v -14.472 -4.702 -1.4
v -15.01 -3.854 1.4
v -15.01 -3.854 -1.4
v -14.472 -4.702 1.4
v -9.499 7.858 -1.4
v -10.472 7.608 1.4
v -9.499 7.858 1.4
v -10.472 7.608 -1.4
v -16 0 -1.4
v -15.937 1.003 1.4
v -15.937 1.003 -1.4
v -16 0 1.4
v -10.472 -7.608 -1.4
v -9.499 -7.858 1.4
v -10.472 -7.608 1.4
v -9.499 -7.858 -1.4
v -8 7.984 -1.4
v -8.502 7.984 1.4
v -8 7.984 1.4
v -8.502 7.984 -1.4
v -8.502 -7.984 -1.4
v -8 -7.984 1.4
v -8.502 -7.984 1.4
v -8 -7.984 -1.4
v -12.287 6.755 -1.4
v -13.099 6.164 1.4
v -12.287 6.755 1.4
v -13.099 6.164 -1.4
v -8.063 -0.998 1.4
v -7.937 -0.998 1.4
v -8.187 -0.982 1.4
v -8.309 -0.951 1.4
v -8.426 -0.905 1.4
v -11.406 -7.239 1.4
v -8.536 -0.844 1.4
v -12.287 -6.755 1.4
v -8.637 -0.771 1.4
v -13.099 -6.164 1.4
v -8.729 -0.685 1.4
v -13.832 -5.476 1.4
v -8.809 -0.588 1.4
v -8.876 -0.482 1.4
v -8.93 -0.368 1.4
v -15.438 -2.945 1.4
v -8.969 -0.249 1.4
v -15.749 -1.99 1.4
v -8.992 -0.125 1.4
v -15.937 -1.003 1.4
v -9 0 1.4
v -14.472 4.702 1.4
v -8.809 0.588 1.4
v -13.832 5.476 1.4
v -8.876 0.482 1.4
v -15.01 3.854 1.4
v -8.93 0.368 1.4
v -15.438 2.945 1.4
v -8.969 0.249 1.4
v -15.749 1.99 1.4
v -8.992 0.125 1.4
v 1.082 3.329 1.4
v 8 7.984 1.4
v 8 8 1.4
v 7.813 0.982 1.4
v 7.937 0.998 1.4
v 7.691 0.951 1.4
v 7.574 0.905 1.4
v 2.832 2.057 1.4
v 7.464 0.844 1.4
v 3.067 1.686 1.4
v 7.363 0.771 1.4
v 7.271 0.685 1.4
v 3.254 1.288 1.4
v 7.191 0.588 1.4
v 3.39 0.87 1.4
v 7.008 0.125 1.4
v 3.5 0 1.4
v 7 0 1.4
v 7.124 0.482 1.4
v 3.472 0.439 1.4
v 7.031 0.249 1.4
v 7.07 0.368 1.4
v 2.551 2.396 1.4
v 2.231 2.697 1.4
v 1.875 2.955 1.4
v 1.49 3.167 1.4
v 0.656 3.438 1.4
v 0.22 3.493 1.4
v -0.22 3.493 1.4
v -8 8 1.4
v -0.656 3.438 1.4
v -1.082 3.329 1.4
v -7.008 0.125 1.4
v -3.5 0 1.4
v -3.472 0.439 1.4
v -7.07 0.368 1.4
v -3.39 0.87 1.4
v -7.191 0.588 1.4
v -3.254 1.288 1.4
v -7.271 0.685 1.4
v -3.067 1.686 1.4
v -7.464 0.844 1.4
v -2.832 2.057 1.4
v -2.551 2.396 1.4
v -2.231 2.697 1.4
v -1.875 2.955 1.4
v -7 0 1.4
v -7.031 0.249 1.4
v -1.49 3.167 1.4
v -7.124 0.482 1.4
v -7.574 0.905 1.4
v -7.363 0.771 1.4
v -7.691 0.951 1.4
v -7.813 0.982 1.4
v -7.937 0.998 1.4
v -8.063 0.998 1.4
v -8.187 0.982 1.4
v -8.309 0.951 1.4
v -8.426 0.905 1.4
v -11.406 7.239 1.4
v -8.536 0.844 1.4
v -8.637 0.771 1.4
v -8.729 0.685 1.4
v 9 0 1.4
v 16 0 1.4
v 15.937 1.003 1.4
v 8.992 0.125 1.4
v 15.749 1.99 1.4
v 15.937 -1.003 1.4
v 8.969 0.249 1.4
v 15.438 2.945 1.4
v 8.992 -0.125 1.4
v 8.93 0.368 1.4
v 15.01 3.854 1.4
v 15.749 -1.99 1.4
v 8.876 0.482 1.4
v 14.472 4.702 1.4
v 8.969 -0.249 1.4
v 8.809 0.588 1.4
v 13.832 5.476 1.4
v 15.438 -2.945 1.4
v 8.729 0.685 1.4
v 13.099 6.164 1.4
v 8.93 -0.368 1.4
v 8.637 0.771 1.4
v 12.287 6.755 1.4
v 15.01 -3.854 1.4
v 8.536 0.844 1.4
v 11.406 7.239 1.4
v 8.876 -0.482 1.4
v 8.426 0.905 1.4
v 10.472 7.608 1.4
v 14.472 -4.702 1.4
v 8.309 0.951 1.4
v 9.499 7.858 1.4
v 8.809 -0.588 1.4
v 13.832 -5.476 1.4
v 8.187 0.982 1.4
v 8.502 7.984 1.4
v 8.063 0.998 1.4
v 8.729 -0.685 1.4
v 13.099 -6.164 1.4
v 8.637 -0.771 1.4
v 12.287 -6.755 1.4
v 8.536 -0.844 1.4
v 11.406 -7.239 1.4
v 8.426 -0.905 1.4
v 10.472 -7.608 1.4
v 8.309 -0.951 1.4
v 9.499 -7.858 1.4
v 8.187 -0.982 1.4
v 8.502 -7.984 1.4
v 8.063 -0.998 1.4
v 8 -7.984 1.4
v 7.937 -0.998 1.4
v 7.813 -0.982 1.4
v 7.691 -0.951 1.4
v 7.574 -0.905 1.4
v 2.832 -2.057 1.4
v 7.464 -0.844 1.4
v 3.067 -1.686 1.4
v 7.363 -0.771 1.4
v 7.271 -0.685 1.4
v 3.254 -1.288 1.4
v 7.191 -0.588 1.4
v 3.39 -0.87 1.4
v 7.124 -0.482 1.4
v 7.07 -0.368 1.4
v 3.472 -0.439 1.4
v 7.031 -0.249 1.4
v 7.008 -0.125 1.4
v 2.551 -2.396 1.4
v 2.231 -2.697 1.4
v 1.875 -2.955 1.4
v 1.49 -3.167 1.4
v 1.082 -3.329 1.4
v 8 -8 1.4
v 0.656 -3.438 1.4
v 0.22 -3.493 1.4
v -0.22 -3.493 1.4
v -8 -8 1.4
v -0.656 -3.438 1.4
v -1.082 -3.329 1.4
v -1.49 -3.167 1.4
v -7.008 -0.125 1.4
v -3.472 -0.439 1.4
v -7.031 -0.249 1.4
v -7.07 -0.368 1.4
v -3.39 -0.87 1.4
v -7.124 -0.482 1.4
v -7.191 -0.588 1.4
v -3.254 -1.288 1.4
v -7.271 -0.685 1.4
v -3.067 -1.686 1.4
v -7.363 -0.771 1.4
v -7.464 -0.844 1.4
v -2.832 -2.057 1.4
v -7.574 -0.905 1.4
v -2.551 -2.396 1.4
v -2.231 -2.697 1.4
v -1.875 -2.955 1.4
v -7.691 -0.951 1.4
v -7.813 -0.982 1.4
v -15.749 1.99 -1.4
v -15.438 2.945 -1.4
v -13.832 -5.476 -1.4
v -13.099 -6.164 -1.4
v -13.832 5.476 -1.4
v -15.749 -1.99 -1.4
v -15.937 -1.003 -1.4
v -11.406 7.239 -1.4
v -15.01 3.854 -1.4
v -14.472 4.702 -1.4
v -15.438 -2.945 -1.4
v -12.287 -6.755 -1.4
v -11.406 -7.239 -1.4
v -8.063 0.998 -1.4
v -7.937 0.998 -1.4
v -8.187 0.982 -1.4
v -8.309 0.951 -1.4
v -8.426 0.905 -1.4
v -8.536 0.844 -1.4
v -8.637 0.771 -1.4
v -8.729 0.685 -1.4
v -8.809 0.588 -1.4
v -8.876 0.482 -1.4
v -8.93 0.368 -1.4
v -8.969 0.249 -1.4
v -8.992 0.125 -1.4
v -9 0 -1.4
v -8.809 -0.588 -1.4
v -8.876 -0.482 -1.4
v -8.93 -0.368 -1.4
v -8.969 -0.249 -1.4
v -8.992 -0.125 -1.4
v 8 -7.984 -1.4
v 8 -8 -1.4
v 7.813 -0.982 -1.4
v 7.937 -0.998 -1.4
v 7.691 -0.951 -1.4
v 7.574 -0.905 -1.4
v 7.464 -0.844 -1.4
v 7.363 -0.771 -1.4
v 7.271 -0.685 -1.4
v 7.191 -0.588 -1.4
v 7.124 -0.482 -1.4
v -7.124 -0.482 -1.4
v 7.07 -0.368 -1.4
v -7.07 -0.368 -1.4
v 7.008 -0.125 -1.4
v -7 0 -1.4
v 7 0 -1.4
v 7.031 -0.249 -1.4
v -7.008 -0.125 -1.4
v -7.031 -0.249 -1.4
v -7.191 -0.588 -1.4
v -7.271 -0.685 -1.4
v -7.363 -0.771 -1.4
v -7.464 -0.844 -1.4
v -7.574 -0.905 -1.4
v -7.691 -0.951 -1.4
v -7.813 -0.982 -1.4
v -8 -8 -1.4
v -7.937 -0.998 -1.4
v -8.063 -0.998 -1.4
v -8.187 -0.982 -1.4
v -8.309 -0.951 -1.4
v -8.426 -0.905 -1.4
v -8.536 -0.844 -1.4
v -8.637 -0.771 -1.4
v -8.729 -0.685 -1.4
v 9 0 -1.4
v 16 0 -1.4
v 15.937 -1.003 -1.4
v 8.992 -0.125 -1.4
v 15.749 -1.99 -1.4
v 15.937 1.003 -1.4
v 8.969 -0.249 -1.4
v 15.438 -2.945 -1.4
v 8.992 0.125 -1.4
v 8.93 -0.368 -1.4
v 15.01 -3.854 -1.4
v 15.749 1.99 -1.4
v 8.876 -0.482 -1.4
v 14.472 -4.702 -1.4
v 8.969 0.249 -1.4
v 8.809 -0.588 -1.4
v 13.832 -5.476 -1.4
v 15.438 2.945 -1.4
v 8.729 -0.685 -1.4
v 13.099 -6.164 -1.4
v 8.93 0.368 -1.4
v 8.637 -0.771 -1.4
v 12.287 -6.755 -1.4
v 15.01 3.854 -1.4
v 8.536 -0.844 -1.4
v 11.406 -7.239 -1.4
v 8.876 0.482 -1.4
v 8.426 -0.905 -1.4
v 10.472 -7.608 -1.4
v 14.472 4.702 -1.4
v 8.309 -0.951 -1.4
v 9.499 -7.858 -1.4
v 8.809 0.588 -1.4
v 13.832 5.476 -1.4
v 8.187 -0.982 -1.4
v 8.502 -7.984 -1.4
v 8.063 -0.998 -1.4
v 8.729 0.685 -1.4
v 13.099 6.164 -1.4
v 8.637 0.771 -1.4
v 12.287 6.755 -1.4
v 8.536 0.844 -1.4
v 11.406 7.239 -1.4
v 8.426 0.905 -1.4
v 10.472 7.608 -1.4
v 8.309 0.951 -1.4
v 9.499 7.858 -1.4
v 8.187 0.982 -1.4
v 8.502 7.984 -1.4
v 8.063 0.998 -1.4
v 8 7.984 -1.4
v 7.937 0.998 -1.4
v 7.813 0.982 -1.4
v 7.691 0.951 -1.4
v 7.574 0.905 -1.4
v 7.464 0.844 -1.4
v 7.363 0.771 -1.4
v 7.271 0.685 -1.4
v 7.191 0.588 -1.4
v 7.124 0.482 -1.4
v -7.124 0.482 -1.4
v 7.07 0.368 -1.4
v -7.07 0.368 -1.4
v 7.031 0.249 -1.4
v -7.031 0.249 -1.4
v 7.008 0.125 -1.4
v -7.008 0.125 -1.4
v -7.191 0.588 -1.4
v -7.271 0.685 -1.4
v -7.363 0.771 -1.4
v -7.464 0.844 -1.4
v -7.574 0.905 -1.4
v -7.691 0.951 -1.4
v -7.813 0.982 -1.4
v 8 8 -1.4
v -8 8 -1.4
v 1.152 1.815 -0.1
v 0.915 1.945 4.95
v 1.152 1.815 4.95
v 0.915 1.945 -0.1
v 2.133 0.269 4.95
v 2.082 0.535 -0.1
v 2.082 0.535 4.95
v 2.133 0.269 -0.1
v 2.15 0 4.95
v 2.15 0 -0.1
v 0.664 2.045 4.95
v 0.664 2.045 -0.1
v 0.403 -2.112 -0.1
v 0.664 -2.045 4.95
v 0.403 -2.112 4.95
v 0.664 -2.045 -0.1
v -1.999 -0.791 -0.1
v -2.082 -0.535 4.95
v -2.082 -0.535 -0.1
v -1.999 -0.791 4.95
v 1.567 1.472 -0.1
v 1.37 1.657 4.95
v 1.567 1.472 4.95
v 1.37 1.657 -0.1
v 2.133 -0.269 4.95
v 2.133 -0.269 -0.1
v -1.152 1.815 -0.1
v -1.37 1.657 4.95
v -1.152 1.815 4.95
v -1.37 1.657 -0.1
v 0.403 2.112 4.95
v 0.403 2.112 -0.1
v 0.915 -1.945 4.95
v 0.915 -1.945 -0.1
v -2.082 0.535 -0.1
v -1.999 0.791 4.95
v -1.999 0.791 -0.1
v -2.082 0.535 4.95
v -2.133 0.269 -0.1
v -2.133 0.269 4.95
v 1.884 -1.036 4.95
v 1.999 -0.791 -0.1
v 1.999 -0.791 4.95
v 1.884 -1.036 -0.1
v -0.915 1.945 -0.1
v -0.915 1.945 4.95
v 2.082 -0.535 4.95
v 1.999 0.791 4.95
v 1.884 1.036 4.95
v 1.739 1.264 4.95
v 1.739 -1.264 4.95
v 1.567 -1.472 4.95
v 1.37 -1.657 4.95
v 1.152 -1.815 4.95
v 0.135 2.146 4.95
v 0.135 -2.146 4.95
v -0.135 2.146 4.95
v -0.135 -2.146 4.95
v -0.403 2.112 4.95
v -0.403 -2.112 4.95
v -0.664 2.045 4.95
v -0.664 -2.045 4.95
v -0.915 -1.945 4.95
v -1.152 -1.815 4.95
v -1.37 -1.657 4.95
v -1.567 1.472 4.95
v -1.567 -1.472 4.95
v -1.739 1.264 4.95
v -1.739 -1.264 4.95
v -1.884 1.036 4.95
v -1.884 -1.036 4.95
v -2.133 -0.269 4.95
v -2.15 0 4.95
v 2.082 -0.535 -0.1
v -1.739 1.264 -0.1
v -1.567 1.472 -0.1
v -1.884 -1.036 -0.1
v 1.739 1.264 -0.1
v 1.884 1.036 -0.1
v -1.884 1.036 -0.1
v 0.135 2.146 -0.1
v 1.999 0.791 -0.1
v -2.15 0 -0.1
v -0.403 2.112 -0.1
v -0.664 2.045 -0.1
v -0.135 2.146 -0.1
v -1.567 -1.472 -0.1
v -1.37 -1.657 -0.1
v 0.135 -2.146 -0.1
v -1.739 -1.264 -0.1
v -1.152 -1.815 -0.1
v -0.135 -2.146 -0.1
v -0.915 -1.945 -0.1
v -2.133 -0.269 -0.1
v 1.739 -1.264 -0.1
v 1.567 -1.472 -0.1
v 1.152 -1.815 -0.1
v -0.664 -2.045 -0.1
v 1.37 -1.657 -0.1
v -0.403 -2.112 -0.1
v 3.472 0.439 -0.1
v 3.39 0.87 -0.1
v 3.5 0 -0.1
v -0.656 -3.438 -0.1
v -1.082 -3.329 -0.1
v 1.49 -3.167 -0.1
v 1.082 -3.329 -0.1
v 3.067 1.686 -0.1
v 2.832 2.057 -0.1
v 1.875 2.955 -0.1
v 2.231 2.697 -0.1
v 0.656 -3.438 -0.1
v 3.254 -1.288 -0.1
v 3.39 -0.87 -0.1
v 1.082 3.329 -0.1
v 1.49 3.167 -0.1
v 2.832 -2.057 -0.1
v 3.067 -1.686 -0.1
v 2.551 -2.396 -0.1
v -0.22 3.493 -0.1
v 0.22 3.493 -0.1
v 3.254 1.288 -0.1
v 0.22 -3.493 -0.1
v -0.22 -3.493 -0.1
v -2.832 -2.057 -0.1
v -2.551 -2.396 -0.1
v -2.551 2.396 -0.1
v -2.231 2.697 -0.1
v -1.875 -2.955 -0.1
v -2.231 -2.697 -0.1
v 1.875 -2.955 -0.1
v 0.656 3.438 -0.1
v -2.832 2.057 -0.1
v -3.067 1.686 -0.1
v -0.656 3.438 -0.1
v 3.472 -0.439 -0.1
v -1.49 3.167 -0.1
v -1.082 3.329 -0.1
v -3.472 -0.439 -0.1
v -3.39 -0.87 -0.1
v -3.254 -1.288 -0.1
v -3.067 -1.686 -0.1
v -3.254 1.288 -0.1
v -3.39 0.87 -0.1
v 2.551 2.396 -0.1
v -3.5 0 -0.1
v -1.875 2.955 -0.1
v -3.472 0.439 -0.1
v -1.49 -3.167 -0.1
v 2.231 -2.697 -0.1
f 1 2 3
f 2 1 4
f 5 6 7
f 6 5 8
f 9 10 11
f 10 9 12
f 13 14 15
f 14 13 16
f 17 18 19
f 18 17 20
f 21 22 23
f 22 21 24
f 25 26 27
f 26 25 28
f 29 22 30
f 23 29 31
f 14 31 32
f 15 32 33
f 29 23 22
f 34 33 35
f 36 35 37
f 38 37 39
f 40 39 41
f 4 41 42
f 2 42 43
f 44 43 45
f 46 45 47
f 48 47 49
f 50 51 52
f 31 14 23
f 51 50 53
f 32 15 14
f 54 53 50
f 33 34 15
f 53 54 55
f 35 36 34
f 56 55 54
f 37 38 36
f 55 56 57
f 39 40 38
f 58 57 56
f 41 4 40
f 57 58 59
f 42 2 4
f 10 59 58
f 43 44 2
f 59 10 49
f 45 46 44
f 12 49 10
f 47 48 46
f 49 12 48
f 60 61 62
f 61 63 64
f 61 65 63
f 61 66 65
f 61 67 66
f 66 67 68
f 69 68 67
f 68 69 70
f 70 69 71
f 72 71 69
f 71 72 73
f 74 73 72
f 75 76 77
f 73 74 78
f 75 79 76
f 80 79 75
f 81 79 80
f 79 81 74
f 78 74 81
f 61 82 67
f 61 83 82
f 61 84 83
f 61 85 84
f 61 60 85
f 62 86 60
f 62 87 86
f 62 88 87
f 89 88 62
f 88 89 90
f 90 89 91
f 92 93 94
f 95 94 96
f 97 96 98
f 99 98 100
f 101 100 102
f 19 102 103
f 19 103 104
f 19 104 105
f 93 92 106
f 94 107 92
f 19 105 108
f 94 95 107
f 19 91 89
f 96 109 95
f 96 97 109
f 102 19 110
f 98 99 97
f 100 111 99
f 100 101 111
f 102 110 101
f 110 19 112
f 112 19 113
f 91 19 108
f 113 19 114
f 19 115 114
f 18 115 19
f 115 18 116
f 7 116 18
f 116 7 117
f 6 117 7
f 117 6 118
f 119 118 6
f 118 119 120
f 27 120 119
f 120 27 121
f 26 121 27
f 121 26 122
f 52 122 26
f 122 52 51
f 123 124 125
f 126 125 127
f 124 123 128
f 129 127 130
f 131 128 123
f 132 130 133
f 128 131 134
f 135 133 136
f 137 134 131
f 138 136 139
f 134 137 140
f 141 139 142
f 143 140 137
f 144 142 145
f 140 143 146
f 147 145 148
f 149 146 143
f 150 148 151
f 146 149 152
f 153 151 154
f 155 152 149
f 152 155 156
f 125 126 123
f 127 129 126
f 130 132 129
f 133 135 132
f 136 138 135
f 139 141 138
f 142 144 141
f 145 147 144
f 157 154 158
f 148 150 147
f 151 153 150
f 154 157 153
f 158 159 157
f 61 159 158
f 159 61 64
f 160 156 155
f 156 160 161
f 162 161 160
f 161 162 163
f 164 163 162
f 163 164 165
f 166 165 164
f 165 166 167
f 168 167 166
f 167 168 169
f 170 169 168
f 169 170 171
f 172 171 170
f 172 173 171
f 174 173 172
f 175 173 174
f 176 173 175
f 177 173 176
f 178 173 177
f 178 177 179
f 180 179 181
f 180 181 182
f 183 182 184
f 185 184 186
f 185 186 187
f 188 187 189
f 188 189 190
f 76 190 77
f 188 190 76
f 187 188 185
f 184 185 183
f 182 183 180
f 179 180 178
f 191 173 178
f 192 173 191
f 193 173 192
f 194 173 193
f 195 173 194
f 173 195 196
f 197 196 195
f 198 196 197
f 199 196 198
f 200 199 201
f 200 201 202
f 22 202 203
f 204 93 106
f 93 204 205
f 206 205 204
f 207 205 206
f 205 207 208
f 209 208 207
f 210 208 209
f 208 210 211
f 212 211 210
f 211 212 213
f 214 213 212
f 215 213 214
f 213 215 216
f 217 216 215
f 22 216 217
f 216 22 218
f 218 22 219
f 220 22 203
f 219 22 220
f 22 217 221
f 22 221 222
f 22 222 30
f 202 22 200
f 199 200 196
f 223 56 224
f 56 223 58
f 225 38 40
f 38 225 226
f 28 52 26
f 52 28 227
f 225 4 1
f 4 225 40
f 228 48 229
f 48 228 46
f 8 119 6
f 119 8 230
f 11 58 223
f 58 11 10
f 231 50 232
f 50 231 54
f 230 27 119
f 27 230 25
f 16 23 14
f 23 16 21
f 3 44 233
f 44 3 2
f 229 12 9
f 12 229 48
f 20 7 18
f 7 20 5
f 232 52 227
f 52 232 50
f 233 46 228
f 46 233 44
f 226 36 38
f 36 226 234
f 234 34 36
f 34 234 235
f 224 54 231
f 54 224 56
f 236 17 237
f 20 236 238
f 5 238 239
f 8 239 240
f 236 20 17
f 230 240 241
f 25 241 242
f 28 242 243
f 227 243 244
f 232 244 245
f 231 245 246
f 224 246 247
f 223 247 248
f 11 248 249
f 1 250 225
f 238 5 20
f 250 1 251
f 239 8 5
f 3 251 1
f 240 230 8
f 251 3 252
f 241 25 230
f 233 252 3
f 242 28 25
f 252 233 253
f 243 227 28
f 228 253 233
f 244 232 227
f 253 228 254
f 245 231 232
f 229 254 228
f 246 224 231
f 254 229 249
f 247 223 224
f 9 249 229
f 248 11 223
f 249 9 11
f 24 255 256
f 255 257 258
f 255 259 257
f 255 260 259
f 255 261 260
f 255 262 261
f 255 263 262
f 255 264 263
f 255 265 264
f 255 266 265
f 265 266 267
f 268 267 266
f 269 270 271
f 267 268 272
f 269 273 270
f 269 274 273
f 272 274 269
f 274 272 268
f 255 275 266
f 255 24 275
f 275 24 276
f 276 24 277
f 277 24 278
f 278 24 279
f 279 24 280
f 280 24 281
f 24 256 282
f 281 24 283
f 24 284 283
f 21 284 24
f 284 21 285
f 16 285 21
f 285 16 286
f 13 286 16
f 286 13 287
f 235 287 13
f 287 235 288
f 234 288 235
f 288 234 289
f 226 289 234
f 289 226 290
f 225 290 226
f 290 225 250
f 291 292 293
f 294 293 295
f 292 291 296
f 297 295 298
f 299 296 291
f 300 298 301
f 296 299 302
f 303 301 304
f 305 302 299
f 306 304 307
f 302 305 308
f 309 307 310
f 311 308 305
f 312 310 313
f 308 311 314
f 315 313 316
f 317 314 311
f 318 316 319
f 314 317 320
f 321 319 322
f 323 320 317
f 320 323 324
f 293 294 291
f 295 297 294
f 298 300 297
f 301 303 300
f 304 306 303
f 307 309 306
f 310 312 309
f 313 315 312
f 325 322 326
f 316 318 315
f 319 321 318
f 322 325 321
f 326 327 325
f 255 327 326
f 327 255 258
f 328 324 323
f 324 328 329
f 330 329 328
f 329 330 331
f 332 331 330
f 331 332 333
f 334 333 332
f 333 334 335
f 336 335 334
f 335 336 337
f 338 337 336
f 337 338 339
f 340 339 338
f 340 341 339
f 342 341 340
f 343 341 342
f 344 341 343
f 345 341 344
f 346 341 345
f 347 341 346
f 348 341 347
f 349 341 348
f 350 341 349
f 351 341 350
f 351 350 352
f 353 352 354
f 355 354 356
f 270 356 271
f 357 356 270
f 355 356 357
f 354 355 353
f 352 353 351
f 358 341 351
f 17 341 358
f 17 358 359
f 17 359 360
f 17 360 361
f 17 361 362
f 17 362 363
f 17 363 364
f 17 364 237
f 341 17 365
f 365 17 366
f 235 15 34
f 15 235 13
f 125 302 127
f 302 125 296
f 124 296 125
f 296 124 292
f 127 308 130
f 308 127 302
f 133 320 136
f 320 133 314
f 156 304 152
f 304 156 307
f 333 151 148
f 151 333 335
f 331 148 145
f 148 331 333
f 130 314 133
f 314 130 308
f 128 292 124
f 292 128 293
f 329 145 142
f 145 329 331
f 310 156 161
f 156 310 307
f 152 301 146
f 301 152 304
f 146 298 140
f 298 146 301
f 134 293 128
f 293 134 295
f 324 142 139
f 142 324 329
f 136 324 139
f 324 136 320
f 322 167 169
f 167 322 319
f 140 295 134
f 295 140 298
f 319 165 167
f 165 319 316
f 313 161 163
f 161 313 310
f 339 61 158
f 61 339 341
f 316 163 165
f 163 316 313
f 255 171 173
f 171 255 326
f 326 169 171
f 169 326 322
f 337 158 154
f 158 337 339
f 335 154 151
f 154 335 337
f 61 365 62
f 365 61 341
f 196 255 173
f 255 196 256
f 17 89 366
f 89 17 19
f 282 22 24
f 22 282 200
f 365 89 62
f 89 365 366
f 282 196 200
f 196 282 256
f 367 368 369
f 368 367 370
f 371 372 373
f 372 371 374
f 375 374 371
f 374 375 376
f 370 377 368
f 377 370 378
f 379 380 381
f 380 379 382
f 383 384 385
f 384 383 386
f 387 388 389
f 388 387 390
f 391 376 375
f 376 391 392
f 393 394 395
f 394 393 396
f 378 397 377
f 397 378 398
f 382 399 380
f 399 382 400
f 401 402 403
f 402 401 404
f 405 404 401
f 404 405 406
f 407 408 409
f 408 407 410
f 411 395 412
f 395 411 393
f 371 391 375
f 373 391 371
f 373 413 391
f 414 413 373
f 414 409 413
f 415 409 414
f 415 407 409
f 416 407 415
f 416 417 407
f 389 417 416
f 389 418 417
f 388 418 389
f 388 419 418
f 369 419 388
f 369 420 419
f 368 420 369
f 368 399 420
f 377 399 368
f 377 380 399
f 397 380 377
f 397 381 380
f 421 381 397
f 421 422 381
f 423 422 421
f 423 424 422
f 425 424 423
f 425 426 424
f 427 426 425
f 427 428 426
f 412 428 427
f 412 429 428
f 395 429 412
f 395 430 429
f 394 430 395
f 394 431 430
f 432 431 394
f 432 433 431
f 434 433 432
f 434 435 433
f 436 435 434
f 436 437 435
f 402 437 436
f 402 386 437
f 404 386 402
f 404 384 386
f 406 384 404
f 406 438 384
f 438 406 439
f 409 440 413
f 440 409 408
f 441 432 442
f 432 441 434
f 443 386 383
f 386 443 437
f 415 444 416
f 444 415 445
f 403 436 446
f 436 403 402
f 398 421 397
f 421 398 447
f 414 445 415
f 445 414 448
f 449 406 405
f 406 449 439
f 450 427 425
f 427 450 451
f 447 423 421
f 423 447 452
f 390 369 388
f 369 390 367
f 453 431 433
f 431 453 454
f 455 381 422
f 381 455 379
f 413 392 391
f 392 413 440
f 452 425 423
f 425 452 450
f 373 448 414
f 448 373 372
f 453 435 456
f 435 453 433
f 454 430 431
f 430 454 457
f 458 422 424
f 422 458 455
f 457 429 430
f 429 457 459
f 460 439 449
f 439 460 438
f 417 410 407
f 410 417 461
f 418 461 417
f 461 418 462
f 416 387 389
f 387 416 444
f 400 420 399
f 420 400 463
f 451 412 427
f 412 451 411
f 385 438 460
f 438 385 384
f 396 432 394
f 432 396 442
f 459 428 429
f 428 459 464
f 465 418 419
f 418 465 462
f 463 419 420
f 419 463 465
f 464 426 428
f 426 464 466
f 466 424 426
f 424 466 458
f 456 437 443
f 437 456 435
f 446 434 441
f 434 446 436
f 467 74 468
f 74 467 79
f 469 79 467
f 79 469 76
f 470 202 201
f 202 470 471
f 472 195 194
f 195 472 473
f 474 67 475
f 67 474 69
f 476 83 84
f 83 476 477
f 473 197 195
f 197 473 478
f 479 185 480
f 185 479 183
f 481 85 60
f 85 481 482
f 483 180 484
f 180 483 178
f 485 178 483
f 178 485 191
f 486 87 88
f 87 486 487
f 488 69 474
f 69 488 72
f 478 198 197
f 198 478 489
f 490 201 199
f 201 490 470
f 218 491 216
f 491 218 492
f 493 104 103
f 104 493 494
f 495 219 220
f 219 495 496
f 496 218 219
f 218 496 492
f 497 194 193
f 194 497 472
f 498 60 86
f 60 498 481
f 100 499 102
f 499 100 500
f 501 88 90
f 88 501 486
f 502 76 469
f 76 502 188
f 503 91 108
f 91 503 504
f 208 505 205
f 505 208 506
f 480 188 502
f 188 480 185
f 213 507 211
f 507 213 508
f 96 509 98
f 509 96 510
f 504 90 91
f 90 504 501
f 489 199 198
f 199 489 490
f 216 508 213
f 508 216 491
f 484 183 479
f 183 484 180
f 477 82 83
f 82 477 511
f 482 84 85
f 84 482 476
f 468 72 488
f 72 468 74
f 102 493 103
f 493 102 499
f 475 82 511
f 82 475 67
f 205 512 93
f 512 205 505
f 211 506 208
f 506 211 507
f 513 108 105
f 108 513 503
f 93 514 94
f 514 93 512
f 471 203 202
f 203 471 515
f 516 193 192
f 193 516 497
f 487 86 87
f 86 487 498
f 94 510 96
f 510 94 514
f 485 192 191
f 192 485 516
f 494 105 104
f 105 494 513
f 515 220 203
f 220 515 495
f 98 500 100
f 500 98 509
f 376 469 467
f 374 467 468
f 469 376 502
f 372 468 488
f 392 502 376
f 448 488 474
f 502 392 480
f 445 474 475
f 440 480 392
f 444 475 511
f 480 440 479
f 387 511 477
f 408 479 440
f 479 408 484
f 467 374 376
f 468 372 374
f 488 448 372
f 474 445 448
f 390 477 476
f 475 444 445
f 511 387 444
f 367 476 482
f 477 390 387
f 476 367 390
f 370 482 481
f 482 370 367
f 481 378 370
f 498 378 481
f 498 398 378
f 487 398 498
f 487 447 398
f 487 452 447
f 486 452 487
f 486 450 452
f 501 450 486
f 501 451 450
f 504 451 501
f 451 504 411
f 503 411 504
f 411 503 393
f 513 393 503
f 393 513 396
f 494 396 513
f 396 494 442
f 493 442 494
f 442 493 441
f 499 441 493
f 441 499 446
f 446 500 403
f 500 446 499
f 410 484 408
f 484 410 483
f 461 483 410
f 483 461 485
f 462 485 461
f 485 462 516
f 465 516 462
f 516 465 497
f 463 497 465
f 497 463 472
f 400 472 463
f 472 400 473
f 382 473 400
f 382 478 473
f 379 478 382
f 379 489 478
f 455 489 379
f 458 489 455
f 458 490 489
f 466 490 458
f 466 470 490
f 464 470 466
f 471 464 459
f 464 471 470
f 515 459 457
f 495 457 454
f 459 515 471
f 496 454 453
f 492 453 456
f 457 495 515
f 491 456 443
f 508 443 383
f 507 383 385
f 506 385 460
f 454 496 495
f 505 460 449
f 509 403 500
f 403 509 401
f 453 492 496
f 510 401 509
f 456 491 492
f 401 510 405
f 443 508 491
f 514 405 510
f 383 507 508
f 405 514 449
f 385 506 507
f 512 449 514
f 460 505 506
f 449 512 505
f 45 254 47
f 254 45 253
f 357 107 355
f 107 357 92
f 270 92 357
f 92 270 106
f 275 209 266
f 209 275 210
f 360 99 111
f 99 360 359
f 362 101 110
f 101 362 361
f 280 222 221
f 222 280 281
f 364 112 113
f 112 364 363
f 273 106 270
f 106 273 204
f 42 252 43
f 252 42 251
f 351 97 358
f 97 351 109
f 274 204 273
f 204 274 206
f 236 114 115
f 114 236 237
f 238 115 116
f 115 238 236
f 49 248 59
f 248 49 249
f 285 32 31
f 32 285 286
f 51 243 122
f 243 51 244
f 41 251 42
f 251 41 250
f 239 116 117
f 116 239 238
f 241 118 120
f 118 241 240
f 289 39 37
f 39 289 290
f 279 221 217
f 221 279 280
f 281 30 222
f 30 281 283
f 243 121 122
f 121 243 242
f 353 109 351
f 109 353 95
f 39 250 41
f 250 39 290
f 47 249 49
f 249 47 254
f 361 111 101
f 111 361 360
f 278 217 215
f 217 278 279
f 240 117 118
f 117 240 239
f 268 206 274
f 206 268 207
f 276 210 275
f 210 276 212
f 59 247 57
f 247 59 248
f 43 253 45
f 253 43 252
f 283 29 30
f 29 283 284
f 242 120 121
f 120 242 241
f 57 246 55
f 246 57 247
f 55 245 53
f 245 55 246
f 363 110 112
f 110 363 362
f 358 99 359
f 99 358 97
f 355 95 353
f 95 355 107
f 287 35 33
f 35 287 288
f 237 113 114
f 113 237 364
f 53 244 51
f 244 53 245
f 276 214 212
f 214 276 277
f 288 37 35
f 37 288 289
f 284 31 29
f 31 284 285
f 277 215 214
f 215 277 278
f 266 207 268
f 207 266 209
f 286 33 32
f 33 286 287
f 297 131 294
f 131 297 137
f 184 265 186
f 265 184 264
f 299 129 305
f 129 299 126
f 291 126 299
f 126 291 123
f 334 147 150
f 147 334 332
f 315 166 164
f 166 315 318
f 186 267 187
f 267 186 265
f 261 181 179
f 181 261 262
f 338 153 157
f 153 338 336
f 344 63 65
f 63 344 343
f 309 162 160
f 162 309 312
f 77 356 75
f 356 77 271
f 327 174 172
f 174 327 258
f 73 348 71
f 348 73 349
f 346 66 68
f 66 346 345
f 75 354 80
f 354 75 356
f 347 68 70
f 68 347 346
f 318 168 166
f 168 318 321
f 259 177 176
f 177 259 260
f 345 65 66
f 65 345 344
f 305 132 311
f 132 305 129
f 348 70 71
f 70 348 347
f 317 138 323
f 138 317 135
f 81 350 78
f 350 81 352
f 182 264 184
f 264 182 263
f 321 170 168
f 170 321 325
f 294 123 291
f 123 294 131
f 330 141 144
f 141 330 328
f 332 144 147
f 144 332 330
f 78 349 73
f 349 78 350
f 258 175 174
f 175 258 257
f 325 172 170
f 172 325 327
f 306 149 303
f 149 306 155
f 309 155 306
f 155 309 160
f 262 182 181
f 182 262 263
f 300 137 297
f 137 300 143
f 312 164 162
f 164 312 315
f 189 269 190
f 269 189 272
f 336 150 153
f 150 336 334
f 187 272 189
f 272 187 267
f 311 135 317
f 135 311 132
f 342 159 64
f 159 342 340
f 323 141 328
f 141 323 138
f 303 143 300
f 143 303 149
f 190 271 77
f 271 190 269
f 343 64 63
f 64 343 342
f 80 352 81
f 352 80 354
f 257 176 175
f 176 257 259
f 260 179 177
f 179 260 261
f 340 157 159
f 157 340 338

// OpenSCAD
$fn=50;
$base_thickness=2.8;
$base_lenght=32;
$base_width=16;
$base_screw_hole_diameter=2;
$base_fixing_pin_diameter=4.3;
$base_fixing_pin_height=4.3;
$base_fixing_ring_diameter=7;
$base_fixing_ring_height=1.5;


difference(){
    union(){
//-------------base        
translate([-$base_width/2,0,0]) cylinder(d=$base_width,h=$base_thickness, center=true);
translate([$base_width/2,0,0]) cylinder(d=$base_width,h=$base_thickness, center=true);
cube([$base_width,$base_width,$base_thickness], center=true);
//----------fixing pin
translate([0,0,$base_thickness]) cylinder(d=$base_fixing_pin_diameter,h=$base_fixing_pin_height, center=true);
}
//------------ screw holes
translate([-$base_width/2,0,0]) cylinder(d=$base_screw_hole_diameter,h=$base_thickness, center=true);
translate([$base_width/2,0,0]) cylinder(d=$base_screw_hole_diameter,h=$base_thickness, center=true);
//----------fixing ring
translate([0,0,$base_thickness/2-$base_fixing_ring_height/2]) difference(){ cylinder(d=$base_fixing_ring_diameter,h=$base_fixing_ring_height, center=true);
    cylinder(d=$base_fixing_pin_diameter,h=$base_fixing_ring_height, center=true);
    };

}
